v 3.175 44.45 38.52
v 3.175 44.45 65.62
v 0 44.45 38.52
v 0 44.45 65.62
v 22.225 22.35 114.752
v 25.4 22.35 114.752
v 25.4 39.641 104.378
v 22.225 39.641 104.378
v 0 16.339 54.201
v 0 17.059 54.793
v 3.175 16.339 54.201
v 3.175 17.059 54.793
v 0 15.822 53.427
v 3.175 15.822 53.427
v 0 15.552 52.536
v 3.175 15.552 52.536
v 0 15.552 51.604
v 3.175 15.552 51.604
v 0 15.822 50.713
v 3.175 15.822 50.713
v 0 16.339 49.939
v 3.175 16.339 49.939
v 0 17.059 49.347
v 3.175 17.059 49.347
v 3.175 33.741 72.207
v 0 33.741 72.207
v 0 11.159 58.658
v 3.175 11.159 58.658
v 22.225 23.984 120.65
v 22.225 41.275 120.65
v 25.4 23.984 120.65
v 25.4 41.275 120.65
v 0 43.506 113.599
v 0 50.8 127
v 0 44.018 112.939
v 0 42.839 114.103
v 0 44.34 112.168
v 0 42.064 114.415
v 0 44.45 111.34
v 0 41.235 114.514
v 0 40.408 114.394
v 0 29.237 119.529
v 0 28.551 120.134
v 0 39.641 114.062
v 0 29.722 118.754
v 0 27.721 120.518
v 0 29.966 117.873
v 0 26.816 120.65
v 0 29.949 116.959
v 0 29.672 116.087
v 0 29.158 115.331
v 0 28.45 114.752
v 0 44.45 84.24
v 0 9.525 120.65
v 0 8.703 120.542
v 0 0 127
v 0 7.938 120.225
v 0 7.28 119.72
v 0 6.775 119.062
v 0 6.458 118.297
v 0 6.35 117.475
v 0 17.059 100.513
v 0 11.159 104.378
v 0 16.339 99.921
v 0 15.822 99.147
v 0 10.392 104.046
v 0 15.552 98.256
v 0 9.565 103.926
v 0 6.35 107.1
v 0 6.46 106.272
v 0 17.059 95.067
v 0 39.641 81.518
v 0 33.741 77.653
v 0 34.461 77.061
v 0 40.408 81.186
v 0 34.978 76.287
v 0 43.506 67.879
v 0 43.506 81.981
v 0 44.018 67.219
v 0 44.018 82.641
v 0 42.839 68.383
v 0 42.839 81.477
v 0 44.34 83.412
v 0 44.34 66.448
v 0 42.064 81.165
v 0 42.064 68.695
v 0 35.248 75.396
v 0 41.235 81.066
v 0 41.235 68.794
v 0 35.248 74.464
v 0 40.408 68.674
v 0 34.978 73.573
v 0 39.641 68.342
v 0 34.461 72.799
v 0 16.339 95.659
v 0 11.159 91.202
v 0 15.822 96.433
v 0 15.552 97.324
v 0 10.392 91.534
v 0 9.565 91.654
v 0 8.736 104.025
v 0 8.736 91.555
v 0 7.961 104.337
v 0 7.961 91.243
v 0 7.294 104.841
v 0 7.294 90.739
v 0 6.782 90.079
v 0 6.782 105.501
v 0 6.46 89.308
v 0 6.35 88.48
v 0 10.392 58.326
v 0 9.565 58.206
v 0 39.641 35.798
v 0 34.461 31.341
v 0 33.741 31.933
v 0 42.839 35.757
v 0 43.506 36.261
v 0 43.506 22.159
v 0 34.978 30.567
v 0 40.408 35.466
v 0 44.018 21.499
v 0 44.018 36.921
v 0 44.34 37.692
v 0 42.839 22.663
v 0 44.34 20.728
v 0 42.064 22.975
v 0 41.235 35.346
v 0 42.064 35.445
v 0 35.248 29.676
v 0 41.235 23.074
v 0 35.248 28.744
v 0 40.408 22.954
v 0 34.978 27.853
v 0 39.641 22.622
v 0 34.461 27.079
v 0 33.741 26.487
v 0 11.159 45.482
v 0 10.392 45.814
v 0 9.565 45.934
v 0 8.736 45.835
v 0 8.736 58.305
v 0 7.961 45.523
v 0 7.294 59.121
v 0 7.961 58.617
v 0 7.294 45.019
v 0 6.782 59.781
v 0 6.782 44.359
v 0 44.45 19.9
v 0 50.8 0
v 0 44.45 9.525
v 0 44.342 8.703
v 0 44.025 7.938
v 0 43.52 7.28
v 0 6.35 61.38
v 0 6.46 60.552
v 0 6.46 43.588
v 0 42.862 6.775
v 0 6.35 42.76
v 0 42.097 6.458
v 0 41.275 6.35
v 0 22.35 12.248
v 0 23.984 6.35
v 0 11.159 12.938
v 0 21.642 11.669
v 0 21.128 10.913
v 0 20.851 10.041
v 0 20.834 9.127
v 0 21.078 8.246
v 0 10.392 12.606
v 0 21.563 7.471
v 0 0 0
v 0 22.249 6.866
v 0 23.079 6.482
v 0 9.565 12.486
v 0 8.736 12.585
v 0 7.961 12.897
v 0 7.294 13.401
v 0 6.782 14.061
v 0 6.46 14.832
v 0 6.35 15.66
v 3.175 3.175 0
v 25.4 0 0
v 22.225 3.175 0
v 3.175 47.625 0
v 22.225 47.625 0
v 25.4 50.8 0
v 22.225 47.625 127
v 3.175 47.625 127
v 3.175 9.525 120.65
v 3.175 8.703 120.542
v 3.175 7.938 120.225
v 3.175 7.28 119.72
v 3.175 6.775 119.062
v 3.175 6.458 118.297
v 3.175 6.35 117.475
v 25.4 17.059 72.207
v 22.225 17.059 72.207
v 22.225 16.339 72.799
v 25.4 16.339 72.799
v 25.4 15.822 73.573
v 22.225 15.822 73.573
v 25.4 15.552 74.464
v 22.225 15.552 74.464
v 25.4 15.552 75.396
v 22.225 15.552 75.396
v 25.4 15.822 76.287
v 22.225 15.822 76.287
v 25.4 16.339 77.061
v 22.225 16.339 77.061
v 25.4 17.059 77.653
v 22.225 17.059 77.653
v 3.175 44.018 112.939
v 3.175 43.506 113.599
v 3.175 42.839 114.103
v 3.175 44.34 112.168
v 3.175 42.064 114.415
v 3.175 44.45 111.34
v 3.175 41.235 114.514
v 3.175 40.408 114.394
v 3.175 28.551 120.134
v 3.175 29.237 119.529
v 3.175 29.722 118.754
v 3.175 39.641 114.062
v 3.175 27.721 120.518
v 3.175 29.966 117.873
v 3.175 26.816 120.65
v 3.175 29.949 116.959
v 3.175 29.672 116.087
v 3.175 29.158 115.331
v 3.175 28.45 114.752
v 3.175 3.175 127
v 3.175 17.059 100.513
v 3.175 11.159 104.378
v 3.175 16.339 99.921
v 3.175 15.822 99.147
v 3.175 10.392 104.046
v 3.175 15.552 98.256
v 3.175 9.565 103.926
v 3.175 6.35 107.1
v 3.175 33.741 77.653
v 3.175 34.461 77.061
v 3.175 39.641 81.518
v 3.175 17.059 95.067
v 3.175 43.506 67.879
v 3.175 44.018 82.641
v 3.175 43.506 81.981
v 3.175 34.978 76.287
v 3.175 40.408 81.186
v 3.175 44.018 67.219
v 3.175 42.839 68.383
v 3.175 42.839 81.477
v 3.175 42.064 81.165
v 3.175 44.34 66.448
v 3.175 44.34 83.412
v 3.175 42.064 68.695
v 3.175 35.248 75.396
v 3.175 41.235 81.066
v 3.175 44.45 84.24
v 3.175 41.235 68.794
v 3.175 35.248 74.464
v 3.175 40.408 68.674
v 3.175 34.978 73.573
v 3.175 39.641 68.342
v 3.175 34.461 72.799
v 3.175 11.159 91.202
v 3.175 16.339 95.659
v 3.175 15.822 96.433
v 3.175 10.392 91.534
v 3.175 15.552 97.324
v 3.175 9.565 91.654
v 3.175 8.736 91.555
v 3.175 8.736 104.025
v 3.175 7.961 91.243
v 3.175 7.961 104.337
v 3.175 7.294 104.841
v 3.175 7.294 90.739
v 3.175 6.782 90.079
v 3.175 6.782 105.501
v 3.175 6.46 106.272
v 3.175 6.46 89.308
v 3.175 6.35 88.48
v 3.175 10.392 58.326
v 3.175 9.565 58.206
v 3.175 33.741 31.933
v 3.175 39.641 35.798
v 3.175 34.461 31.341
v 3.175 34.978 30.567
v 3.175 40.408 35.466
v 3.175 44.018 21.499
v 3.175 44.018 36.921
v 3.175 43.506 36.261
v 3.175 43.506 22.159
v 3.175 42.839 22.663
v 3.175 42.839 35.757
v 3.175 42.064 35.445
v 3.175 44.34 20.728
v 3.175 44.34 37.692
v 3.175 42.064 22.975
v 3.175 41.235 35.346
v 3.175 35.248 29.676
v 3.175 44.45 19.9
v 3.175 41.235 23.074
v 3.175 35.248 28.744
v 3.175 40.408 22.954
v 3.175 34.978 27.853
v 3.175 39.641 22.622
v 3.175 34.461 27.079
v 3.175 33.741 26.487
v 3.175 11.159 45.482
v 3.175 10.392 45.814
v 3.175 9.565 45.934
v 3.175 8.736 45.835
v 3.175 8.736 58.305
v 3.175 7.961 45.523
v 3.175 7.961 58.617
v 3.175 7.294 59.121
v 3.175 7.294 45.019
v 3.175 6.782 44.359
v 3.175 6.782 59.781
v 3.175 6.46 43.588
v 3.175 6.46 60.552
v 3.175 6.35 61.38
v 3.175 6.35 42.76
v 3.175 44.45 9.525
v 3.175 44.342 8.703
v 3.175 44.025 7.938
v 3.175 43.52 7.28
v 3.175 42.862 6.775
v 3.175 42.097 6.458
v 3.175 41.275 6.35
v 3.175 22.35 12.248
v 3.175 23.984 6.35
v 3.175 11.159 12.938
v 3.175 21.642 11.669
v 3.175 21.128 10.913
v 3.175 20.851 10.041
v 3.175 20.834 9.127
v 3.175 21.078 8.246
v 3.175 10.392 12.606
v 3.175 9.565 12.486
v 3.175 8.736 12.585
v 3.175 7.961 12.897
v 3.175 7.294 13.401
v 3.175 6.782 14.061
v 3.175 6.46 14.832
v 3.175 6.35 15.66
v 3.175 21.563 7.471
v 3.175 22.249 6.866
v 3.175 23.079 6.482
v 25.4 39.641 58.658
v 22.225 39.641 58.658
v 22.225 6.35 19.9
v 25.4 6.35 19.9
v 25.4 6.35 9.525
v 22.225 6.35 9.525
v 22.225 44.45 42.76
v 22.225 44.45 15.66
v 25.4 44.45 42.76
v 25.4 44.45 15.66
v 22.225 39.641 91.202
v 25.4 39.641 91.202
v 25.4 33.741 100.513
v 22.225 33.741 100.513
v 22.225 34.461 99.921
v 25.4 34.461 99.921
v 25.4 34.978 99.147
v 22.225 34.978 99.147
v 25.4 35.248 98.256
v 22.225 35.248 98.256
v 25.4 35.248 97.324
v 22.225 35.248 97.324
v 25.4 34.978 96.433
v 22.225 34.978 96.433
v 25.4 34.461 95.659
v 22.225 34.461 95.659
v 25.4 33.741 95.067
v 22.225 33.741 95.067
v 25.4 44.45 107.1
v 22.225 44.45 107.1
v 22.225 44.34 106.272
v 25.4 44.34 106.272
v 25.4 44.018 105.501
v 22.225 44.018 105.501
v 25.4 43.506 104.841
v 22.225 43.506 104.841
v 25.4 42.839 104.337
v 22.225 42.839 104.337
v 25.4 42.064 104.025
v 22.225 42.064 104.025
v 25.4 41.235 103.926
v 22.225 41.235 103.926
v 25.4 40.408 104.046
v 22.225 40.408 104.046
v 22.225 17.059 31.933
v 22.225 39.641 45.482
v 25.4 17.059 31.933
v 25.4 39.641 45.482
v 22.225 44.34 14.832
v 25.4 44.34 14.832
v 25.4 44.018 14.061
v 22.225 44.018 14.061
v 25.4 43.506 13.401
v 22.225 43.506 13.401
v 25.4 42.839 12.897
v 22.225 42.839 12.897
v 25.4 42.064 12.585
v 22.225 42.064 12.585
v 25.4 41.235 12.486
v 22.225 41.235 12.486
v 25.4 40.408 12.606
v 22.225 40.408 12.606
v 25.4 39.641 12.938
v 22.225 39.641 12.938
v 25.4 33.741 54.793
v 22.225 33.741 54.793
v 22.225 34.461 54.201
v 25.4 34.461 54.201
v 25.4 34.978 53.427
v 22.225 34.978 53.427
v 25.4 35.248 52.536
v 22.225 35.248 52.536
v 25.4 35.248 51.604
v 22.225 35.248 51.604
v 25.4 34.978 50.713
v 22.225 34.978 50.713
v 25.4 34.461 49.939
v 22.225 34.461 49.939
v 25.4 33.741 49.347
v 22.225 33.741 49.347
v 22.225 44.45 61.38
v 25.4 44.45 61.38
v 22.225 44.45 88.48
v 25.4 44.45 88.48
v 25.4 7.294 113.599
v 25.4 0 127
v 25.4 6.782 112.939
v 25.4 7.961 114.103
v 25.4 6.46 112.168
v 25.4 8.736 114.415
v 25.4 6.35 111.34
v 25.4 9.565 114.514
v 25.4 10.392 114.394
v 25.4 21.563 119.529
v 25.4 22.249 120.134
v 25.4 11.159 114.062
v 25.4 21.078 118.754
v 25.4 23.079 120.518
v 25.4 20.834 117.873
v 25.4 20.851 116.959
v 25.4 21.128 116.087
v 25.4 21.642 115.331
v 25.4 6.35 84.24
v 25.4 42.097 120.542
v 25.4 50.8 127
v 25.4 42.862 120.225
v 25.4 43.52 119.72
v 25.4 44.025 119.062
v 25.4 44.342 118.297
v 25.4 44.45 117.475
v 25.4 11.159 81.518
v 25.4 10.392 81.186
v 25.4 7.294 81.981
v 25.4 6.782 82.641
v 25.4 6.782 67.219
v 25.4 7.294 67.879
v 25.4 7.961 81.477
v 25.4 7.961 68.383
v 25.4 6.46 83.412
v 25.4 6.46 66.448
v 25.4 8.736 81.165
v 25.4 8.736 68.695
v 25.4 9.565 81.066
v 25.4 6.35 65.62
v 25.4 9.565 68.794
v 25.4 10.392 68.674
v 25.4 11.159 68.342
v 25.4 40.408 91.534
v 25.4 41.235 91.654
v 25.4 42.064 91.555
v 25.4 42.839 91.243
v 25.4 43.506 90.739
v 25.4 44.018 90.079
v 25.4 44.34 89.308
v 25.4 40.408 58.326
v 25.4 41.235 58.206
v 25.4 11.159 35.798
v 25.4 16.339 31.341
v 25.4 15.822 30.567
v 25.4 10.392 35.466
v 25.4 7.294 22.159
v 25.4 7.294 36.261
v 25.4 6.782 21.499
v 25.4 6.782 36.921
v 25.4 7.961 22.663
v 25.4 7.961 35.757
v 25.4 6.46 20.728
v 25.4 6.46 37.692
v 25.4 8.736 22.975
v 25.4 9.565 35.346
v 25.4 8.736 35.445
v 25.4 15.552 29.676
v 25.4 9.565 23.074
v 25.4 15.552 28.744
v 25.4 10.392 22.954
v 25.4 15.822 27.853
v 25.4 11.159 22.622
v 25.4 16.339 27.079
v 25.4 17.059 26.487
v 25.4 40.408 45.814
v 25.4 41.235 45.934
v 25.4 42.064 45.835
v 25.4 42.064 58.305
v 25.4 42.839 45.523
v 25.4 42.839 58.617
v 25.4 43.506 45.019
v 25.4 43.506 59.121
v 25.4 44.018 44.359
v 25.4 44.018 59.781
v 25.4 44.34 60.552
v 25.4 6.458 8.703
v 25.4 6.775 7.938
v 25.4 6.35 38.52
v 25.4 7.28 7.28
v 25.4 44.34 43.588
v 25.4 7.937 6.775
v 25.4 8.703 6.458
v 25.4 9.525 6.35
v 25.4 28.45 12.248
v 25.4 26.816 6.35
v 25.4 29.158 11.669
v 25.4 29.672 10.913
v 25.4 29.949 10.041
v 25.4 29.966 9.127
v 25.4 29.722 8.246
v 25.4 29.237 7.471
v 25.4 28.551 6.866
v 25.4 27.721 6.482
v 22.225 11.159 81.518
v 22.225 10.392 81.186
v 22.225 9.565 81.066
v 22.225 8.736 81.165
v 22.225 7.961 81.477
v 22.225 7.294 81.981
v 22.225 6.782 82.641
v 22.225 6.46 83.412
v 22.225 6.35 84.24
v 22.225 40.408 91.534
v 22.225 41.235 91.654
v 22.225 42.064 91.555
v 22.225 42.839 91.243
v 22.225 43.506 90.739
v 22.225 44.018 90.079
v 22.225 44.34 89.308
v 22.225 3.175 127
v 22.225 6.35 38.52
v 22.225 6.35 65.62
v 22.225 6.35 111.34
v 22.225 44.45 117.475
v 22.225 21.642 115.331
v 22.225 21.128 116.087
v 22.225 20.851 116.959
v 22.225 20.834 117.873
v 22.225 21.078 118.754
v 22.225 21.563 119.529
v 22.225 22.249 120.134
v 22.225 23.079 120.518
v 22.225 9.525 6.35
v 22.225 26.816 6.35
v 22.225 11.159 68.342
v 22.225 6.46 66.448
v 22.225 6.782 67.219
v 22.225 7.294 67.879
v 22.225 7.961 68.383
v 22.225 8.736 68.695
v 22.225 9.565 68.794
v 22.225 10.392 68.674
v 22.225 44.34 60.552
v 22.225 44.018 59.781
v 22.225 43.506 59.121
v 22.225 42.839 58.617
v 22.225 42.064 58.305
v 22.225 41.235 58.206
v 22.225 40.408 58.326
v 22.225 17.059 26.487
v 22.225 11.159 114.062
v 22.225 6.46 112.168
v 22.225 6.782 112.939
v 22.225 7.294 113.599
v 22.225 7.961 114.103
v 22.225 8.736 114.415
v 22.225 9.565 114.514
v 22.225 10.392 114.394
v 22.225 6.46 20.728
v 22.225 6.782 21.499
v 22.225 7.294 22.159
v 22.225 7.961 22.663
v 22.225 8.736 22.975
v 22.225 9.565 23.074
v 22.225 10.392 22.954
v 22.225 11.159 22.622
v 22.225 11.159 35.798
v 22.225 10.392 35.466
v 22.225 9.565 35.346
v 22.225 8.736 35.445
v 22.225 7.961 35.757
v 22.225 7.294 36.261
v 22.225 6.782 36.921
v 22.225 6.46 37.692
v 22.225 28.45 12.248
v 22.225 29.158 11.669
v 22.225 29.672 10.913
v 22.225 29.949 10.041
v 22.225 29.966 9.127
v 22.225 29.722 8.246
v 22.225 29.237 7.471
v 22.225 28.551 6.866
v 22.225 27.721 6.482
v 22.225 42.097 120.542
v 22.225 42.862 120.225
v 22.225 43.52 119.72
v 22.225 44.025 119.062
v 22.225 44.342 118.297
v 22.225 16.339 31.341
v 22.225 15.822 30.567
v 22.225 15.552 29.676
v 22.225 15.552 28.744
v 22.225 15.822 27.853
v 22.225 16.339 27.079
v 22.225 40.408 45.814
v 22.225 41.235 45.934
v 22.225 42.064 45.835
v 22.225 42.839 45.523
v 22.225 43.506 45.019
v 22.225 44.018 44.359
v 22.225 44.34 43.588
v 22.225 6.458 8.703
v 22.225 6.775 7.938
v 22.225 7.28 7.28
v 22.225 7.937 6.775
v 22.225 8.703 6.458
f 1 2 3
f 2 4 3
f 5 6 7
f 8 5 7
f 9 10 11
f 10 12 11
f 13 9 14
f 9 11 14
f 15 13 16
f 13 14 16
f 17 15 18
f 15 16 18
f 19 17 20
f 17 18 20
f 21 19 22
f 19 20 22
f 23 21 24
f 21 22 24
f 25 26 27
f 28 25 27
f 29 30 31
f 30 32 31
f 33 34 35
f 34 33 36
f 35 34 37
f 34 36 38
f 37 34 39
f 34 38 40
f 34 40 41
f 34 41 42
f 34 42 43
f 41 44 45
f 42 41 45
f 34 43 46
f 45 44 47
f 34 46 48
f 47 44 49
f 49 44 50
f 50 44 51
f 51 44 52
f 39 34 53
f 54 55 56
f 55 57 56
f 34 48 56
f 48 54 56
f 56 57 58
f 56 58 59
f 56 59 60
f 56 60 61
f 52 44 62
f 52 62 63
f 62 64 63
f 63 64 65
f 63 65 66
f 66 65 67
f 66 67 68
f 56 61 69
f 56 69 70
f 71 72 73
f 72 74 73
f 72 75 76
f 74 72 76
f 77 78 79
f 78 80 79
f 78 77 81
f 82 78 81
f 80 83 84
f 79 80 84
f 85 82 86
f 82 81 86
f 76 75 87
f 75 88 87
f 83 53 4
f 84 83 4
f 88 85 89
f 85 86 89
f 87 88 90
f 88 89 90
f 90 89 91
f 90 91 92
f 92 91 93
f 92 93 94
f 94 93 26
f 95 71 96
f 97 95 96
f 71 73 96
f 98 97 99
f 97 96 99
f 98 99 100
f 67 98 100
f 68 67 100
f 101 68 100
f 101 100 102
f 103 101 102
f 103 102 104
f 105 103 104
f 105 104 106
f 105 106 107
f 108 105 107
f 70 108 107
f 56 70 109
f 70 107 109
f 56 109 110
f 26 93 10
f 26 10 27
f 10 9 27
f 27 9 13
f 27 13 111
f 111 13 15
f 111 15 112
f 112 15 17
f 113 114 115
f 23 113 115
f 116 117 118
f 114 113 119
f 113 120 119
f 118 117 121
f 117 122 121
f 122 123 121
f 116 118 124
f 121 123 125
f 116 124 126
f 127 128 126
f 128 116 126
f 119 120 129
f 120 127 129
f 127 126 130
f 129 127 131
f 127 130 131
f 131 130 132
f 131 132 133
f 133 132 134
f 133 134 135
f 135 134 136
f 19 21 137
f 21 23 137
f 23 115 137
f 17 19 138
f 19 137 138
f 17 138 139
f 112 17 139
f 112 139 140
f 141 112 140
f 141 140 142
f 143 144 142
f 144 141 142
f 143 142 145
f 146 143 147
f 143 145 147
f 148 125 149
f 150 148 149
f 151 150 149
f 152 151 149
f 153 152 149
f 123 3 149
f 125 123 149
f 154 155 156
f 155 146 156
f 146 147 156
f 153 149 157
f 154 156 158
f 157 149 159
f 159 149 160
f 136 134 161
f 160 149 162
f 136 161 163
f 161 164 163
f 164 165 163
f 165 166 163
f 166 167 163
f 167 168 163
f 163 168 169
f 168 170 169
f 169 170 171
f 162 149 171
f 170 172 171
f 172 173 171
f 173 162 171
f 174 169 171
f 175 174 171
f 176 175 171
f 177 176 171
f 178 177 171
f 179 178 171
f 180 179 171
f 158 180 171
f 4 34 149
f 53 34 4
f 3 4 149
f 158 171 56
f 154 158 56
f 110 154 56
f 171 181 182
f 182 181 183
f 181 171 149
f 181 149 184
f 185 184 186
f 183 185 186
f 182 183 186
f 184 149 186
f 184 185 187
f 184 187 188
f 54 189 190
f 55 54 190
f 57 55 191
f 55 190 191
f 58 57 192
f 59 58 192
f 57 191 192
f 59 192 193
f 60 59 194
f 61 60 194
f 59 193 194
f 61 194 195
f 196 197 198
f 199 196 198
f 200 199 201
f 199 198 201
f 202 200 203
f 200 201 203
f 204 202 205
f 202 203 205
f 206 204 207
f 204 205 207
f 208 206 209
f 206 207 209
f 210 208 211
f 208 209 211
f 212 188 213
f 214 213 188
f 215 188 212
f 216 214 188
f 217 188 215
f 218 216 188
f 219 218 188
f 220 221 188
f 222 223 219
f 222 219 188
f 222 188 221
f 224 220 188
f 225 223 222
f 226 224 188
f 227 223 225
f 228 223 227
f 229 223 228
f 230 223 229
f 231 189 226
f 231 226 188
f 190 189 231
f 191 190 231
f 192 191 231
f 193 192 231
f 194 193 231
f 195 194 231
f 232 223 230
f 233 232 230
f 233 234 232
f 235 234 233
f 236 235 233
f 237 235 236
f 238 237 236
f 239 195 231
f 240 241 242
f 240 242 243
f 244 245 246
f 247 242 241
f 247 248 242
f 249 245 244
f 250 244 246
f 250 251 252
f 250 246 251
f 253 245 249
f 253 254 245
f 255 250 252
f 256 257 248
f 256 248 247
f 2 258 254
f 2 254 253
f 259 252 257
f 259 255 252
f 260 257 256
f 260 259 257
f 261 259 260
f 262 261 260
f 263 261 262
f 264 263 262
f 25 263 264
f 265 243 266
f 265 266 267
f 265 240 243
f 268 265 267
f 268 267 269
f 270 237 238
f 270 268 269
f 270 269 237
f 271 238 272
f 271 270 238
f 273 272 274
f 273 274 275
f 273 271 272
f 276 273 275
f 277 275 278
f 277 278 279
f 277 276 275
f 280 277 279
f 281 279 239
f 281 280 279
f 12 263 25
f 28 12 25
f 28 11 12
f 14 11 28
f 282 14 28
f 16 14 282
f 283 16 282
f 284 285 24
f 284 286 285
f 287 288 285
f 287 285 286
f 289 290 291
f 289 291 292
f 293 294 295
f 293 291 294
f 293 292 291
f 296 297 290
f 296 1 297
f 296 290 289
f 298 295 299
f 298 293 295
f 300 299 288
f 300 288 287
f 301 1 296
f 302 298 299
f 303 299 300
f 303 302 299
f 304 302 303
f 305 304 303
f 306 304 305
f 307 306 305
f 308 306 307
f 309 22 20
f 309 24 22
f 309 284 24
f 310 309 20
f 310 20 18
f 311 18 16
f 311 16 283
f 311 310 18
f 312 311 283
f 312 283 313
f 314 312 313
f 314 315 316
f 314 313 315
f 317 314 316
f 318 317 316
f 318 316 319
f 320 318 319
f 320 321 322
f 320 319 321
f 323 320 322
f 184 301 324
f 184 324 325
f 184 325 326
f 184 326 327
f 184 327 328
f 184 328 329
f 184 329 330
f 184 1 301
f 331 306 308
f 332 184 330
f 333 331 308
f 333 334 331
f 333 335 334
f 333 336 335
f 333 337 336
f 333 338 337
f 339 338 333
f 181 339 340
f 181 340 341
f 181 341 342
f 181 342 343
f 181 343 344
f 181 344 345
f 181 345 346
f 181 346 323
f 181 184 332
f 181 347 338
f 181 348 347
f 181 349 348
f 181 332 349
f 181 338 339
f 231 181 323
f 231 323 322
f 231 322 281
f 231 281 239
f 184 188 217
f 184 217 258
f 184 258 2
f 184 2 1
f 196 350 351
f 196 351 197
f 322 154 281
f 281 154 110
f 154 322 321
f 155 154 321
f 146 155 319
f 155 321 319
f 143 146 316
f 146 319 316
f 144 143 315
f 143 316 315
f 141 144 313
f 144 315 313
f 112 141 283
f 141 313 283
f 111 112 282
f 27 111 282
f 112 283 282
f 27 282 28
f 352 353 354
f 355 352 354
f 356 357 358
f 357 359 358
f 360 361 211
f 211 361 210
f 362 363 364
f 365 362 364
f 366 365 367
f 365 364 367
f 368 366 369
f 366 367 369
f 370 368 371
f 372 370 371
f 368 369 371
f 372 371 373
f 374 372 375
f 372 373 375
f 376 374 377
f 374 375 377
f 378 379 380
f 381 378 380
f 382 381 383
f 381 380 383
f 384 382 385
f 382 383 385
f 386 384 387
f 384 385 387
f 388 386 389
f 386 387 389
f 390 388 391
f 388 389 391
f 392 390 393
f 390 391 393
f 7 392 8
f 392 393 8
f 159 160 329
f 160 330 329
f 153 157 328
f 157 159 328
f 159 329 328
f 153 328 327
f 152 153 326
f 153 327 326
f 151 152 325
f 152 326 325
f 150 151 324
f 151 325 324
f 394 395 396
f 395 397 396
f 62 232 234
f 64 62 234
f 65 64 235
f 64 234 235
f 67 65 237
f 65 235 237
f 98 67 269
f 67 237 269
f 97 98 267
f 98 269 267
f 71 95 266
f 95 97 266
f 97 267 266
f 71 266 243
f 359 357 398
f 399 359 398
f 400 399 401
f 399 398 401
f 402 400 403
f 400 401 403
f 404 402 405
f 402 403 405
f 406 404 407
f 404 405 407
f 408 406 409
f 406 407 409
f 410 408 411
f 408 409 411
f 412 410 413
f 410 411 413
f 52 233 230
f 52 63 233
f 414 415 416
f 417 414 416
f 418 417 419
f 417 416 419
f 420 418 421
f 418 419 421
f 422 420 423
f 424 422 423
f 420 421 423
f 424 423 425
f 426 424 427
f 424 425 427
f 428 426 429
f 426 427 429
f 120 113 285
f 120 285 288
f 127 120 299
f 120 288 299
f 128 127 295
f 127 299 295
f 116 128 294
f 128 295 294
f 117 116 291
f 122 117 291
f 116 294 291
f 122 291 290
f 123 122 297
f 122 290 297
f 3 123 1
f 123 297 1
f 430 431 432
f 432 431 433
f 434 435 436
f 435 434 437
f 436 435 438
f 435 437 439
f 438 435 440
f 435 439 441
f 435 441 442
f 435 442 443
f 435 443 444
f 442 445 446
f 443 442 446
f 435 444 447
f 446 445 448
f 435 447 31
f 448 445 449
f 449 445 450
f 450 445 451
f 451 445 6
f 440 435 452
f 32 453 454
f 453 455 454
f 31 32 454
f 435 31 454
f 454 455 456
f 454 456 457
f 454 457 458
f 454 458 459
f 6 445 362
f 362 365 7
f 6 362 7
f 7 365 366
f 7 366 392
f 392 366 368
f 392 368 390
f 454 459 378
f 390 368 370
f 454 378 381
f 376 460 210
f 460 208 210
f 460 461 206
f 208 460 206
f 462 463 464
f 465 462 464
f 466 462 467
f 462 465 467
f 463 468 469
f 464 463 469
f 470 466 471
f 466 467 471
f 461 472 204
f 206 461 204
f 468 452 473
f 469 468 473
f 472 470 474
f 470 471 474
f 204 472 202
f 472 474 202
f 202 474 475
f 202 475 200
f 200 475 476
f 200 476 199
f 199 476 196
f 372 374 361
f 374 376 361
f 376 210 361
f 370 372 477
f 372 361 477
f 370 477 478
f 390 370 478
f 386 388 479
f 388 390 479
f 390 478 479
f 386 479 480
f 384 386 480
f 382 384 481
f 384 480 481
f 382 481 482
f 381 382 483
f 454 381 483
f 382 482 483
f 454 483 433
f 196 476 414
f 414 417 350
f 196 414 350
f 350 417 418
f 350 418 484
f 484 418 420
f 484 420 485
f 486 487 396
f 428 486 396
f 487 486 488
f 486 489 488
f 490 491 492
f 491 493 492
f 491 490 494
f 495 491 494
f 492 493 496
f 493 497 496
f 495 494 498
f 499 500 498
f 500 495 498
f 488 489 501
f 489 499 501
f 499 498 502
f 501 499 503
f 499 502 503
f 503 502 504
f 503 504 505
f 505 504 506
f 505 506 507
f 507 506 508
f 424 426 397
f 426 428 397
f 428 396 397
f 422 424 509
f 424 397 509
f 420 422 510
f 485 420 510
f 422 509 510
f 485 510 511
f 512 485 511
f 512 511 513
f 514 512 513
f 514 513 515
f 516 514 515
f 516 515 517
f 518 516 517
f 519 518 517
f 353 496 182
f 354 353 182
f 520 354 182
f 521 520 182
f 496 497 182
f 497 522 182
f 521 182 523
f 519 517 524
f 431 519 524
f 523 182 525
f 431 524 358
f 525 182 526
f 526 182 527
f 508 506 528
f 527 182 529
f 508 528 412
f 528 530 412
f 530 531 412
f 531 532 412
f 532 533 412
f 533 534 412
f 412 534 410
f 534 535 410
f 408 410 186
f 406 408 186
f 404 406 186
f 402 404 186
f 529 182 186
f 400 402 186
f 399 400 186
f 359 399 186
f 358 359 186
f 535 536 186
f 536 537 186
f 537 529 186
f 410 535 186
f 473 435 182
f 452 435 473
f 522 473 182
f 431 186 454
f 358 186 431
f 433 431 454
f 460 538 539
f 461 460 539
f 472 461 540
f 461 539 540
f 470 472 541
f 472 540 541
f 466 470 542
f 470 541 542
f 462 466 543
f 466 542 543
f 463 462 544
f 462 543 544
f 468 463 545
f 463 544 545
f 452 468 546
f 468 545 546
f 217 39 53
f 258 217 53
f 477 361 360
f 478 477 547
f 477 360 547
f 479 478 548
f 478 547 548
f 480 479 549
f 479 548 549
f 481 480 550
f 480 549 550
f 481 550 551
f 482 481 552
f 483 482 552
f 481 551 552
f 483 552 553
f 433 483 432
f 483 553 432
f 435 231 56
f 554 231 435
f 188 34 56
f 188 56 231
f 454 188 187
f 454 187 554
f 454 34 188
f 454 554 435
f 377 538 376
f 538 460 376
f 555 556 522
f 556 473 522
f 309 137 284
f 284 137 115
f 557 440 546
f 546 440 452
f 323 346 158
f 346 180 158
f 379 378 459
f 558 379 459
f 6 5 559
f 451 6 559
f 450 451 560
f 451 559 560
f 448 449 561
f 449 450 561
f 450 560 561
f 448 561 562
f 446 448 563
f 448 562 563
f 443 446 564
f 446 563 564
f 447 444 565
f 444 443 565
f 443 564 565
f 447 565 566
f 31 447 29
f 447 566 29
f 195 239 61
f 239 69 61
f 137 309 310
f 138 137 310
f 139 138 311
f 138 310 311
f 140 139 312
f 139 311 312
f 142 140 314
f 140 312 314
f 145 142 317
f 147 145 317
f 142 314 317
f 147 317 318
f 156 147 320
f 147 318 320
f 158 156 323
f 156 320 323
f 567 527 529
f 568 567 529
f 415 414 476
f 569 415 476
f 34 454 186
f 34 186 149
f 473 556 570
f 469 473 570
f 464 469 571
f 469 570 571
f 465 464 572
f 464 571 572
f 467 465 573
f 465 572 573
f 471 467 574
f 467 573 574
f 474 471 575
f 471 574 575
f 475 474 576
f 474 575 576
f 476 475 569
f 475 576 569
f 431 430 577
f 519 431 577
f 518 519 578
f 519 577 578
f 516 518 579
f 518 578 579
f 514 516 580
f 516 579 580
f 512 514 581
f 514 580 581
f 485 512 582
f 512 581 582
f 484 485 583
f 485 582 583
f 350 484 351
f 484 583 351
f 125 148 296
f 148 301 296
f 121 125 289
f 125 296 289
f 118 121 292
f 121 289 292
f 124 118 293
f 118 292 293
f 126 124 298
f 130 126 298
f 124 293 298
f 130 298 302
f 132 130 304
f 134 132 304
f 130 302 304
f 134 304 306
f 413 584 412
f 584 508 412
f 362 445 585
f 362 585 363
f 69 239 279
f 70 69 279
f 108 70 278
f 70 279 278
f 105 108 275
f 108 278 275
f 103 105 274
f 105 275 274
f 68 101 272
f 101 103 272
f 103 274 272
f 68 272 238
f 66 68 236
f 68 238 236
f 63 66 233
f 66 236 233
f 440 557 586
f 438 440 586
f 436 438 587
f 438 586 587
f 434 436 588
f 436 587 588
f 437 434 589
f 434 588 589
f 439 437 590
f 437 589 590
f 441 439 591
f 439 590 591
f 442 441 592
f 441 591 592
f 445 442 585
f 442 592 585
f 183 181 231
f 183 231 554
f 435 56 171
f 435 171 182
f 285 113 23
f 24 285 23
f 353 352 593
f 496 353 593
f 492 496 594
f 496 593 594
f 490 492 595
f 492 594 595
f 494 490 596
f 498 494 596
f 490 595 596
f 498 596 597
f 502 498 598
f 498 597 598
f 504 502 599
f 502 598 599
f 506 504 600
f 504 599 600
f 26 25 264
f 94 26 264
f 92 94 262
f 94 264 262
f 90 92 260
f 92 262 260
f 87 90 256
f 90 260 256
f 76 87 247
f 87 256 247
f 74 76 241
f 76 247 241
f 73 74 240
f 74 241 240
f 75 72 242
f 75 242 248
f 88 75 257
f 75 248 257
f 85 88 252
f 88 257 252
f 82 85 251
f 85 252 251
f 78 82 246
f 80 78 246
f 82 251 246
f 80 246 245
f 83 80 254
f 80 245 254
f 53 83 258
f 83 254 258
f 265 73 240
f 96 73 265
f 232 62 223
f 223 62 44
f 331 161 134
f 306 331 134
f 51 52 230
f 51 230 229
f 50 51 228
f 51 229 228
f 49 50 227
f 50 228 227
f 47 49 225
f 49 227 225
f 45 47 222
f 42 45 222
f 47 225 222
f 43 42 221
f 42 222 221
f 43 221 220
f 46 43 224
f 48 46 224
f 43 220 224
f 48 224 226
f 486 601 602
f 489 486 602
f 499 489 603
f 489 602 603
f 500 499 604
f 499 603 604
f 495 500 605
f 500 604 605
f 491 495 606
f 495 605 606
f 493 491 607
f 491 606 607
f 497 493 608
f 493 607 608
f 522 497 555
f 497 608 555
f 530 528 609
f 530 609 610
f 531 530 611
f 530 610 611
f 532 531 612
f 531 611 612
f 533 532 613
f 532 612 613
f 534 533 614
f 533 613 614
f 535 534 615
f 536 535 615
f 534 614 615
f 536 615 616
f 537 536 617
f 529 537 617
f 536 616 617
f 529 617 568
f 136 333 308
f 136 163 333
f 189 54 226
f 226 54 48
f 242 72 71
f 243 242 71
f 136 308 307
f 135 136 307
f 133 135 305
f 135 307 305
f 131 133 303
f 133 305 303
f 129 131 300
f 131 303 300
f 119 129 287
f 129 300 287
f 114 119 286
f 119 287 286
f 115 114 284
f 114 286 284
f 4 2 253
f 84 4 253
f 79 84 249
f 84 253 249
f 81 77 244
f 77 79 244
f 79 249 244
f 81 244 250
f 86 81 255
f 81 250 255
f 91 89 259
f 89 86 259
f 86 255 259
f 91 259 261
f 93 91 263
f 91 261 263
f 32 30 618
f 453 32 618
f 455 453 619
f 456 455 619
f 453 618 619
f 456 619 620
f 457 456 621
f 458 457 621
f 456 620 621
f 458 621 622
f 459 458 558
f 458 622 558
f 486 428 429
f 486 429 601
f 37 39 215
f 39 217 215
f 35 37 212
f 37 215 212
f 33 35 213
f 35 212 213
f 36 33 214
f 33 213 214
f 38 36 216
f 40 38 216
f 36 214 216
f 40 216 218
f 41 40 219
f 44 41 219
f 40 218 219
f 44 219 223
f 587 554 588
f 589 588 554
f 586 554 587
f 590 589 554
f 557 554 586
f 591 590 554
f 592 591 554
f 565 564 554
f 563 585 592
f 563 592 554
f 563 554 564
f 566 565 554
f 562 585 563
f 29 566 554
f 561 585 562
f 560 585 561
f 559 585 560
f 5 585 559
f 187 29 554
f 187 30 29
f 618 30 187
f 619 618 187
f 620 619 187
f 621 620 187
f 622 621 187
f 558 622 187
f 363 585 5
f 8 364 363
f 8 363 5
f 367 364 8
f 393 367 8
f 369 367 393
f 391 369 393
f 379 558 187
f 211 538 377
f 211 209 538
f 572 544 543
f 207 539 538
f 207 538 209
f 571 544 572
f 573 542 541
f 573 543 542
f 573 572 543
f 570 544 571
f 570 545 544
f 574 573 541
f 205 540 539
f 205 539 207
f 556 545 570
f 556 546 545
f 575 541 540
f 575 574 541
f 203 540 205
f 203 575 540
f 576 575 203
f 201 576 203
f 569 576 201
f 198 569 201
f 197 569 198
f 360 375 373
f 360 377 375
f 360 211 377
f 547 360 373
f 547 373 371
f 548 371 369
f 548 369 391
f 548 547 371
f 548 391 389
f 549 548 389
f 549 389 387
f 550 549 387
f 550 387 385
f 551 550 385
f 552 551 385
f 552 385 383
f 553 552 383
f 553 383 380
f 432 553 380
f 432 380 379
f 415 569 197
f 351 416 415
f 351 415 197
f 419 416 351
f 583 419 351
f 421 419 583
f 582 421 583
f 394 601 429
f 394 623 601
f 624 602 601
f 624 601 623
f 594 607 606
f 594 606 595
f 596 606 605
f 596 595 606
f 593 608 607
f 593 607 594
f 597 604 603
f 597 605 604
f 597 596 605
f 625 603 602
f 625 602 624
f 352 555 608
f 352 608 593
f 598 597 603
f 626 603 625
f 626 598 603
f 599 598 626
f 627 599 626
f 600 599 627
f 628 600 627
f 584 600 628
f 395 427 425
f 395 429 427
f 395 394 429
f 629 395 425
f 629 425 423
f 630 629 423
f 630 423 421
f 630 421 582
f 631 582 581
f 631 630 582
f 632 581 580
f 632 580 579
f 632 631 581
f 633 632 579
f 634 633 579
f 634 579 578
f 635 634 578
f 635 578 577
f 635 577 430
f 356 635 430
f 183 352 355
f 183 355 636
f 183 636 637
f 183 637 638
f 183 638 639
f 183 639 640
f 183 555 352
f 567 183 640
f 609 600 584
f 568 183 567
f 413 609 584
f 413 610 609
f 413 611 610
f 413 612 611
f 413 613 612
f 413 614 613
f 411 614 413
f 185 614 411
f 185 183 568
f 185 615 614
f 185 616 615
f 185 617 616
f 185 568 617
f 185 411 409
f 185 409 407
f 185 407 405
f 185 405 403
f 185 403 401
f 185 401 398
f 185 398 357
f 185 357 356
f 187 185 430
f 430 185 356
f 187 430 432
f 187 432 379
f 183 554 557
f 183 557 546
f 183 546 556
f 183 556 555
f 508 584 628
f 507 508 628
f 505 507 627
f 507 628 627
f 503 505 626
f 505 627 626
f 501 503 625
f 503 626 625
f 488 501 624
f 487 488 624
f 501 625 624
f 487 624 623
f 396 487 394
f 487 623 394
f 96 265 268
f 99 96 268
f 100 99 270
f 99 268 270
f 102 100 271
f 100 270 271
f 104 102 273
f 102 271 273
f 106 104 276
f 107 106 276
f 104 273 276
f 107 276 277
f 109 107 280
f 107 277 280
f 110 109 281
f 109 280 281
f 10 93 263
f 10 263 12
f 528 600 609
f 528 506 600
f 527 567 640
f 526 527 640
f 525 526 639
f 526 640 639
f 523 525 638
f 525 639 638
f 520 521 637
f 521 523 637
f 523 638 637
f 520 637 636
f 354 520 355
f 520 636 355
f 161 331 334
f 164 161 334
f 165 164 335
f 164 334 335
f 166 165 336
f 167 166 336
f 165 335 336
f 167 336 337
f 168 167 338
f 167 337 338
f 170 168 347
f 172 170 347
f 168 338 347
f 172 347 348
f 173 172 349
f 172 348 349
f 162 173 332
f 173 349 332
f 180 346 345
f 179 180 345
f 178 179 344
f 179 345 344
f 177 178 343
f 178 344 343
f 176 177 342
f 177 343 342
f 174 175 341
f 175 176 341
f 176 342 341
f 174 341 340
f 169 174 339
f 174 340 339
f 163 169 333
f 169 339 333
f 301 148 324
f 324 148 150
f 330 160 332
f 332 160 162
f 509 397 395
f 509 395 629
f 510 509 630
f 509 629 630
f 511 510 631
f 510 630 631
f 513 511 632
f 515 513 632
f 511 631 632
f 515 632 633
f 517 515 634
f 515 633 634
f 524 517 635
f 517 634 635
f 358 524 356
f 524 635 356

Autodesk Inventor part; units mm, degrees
ref_plane "YZ Plane" through (0, 0, 0) normal (1, 0, 0) x (0, 1, 0)
ref_plane "XZ Plane" through (0, 0, 0) normal (0, 1, 0) x (-1, 0, 0)
ref_plane "XY Plane" through (0, 0, 0) normal (0, 0, 1) x (1, 0, 0)
sketch "Sketch1" plane through (0, 0, 0) normal (0, 0, 1) x (1, 0, 0)
  line L0 (0, 0) -> (25.4, 0)
  line L1 (25.4, 0) -> (25.4, 50.8)
  line L2 (25.4, 50.8) -> (0, 50.8)
  line L3 (0, 50.8) -> (0, 0)
  line L4 (3.175, 3.175) -> (22.225, 3.175)
  line L5 (22.225, 3.175) -> (22.225, 47.625)
  line L6 (22.225, 47.625) -> (3.175, 47.625)
  line L7 (3.175, 47.625) -> (3.175, 3.175)
  dimension "d0" = 50.8
  dimension "d1" = 25.4
  dimension "d2" = 3.175
  dimension "d3" = 3.175
  dimension "d4" = 3.175
  dimension "d5" = 3.175
extrude "Extrusion1" add sketch "Sketch1" along normal blind 127
sketch "Sketch4" plane through (25.4, 0, 0) normal (1, 0, 0) x (0, 0, -1)
  line L0 (0, 0) -> (-127, 0) projected
  line L1 (0, 0) -> (0, 50.8) projected
  line L2 (0, 50.8) -> (-127, 50.8) projected
  line L3 (0, 50.8) -> (0, 0)
  line L4 (-127, 50.8) -> (0, 50.8)
  line L5 (-127, 0) -> (-127, 50.8)
  line L6 (-127, 0) -> (0, 0)
  line L7 (-55.7727, 44.45) -> (-74.93, 12.5211)
  line L8 (-74.93, 6.35) -> (-52.07, 44.45) construction
  line L9 (-120.65, 6.35) -> (-6.35, 6.35)
  line L10 (-6.35, 44.45) -> (-120.65, 44.45)
  line L11 (-52.07, 38.2789) -> (-71.2273, 6.35)
  line L12 (-52.07, 44.45) -> (-29.21, 6.35) construction
  line L13 (-48.3673, 44.45) -> (-29.21, 12.5211)
  line L14 (-94.0873, 44.45) -> (-74.93, 12.5211)
  line L15 (-97.79, 44.45) -> (-74.93, 6.35) construction
  line L16 (-78.6327, 6.35) -> (-97.79, 38.2789)
  line L17 (-52.07, 38.2789) -> (-32.9127, 6.35)
  line L18 (-116.9473, 6.35) -> (-97.79, 38.2789)
  line L19 (-120.65, 44.45) -> (-120.65, 6.35)
  line L20 (-120.65, 6.35) -> (-97.79, 44.45) construction
  line L21 (-120.65, 12.5211) -> (-101.4927, 44.45)
  line L22 (-29.21, 12.5211) -> (-10.0527, 44.45)
  line L23 (-25.5073, 6.35) -> (-6.35, 38.2789)
  line L24 (-6.35, 6.35) -> (-6.35, 44.45)
  line L25 (-29.21, 6.35) -> (-6.35, 44.45) construction
  line L26 (-127, 50.8) -> (-127, 0) projected
  dimension "d20" = 30.964
  dimension "d21" = 61.928
  dimension "d22" = 61.928
  dimension "d23" = 61.928
  dimension "d24" = 61.928
  dimension "d25" = 3.175
  dimension "d26" = 3.175
  dimension "d27" = 3.175
  dimension "d28" = 3.175
  dimension "d29" = 3.175
  dimension "d30" = 3.175
  dimension "d31" = 3.175
  dimension "d32" = 3.175
  dimension "d33" = 3.175
  dimension "d34" = 3.175
  dimension "d35" = 6.35
  dimension "d36" = 6.35
  dimension "d37" = 6.35
  dimension "d38" = 6.35
extrude "Extrusion5" cut sketch "Sketch4" against normal blind 3.175 contours L7 L14 L10 | L10 L22 L13 | L21 L19 L10 | L24 L9 L23 | L18 L16 L9 | L9 L11 L17
sketch "Sketch5" plane through (0, 0, 0) normal (-1, 0, 0) x (0, 0, 1)
  line L0 (127, 0) -> (127, 50.8) projected
  line L1 (0, 50.8) -> (127, 50.8) projected
  line L2 (0, 50.8) -> (0, 0) projected
  line L3 (0, 0) -> (127, 0) projected
  line L4 (0, 0) -> (0, 50.8)
  line L5 (127, 0) -> (0, 0)
  line L6 (127, 50.8) -> (127, 0)
  line L7 (127, 50.8) -> (0, 50.8)
  line L8 (74.93, 38.2789) -> (55.7727, 6.35)
  line L9 (71.2273, 44.45) -> (52.07, 12.5211)
  line L10 (52.07, 6.35) -> (74.93, 44.45) construction
  line L11 (6.35, 6.35) -> (120.65, 6.35)
  line L12 (120.65, 44.45) -> (6.35, 44.45)
  line L13 (74.93, 44.45) -> (97.79, 6.35) construction
  line L14 (74.93, 38.2789) -> (94.0873, 6.35)
  line L15 (97.79, 12.5211) -> (116.9473, 44.45)
  line L16 (97.79, 6.35) -> (120.65, 44.45) construction
  line L17 (120.65, 6.35) -> (120.65, 44.45)
  line L18 (101.4927, 6.35) -> (120.65, 38.2789)
  line L19 (78.6327, 44.45) -> (97.79, 12.5211)
  line L20 (32.9127, 44.45) -> (52.07, 12.5211)
  line L21 (29.21, 44.45) -> (52.07, 6.35) construction
  line L22 (10.0527, 6.35) -> (29.21, 38.2789)
  line L23 (6.35, 44.45) -> (6.35, 6.35)
  line L24 (6.35, 6.35) -> (29.21, 44.45) construction
  line L25 (6.35, 12.5211) -> (25.5073, 44.45)
  line L26 (48.3673, 6.35) -> (29.21, 38.2789)
  dimension "d41" = 30.964
  dimension "d42" = 61.928
  dimension "d43" = 61.928
  dimension "d44" = 61.928
  dimension "d45" = 61.928
  dimension "d46" = 3.175
  dimension "d47" = 3.175
  dimension "d48" = 3.175
  dimension "d49" = 3.175
  dimension "d50" = 3.175
  dimension "d51" = 3.175
  dimension "d52" = 3.175
  dimension "d53" = 3.175
  dimension "d54" = 3.175
  dimension "d55" = 3.175
  dimension "d56" = 6.35
  dimension "d57" = 6.35
  dimension "d58" = 6.35
  dimension "d59" = 6.35
extrude "Extrusion6" cut sketch "Sketch5" against normal blind 3.175 contours L14 L11 L8 | L11 L22 L26 | L18 L17 L11 | L23 L12 L25 | L15 L19 L12 | L12 L9 L20
fillet "Fillet1" radius 3.175 36 edges at (1.5875, 12.5211, 6.35) (1.5875, 44.45, 6.35) (1.5875, 44.45, 25.5073) (1.5875, 38.2789, 29.21) (1.5875, 6.35, 10.0527) (1.5875, 6.35, 48.3673) (1.5875, 44.45, 32.9127) (1.5875, 12.5211, 52.07) (1.5875, 44.45, 71.2273) (1.5875, 38.2789, 74.93) (1.5875, 6.35, 55.7727) (1.5875, 6.35, 94.0873) (1.5875, 44.45, 78.6327) (1.5875, 44.45, 116.9473) (1.5875, 12.5211, 97.79) (1.5875, 38.2789, 120.65) (1.5875, 6.35, 101.4927) (1.5875, 6.35, 120.65) (23.8125, 44.45, 120.65) (23.8125, 44.45, 101.4927) (23.8125, 12.5211, 120.65) (23.8125, 6.35, 116.9473) (23.8125, 38.2789, 97.79) (23.8125, 6.35, 78.6327) (23.8125, 12.5211, 74.93) (23.8125, 44.45, 94.0873) (23.8125, 44.45, 55.7727) (23.8125, 38.2789, 52.07) (23.8125, 6.35, 71.2273) (23.8125, 6.35, 32.9127) (23.8125, 12.5211, 29.21) (23.8125, 44.45, 48.3673) (23.8125, 44.45, 10.0527) (23.8125, 38.2789, 6.35) (23.8125, 6.35, 25.5073) (23.8125, 6.35, 6.35)
equation "\"d3\" = d2"
equation "\"d4\" = d3"
equation "\"d5\" = d4"
equation "\"d21\" = 2 * d20"
equation "\"d22\" = d21"
equation "\"d23\" = d22"
equation "\"d24\" = d23"
equation "\"d26\" = d25"
equation "\"d27\" = d26"
equation "\"d28\" = d27"
equation "\"d29\" = d28"
equation "\"d30\" = d29"
equation "\"d31\" = d30"
equation "\"d32\" = d30"
equation "\"d33\" = d32"
equation "\"d34\" = d33"
equation "\"d42\" = 2 * d41"
equation "\"d43\" = d42"
equation "\"d44\" = d43"
equation "\"d45\" = d44"
equation "\"d47\" = d46"
equation "\"d48\" = d47"
equation "\"d49\" = d48"
equation "\"d50\" = d49"
equation "\"d51\" = d50"
equation "\"d52\" = d51"
equation "\"d53\" = d51"
equation "\"d54\" = d53"
equation "\"d55\" = d54"
properties part number "left fram piece 3"
